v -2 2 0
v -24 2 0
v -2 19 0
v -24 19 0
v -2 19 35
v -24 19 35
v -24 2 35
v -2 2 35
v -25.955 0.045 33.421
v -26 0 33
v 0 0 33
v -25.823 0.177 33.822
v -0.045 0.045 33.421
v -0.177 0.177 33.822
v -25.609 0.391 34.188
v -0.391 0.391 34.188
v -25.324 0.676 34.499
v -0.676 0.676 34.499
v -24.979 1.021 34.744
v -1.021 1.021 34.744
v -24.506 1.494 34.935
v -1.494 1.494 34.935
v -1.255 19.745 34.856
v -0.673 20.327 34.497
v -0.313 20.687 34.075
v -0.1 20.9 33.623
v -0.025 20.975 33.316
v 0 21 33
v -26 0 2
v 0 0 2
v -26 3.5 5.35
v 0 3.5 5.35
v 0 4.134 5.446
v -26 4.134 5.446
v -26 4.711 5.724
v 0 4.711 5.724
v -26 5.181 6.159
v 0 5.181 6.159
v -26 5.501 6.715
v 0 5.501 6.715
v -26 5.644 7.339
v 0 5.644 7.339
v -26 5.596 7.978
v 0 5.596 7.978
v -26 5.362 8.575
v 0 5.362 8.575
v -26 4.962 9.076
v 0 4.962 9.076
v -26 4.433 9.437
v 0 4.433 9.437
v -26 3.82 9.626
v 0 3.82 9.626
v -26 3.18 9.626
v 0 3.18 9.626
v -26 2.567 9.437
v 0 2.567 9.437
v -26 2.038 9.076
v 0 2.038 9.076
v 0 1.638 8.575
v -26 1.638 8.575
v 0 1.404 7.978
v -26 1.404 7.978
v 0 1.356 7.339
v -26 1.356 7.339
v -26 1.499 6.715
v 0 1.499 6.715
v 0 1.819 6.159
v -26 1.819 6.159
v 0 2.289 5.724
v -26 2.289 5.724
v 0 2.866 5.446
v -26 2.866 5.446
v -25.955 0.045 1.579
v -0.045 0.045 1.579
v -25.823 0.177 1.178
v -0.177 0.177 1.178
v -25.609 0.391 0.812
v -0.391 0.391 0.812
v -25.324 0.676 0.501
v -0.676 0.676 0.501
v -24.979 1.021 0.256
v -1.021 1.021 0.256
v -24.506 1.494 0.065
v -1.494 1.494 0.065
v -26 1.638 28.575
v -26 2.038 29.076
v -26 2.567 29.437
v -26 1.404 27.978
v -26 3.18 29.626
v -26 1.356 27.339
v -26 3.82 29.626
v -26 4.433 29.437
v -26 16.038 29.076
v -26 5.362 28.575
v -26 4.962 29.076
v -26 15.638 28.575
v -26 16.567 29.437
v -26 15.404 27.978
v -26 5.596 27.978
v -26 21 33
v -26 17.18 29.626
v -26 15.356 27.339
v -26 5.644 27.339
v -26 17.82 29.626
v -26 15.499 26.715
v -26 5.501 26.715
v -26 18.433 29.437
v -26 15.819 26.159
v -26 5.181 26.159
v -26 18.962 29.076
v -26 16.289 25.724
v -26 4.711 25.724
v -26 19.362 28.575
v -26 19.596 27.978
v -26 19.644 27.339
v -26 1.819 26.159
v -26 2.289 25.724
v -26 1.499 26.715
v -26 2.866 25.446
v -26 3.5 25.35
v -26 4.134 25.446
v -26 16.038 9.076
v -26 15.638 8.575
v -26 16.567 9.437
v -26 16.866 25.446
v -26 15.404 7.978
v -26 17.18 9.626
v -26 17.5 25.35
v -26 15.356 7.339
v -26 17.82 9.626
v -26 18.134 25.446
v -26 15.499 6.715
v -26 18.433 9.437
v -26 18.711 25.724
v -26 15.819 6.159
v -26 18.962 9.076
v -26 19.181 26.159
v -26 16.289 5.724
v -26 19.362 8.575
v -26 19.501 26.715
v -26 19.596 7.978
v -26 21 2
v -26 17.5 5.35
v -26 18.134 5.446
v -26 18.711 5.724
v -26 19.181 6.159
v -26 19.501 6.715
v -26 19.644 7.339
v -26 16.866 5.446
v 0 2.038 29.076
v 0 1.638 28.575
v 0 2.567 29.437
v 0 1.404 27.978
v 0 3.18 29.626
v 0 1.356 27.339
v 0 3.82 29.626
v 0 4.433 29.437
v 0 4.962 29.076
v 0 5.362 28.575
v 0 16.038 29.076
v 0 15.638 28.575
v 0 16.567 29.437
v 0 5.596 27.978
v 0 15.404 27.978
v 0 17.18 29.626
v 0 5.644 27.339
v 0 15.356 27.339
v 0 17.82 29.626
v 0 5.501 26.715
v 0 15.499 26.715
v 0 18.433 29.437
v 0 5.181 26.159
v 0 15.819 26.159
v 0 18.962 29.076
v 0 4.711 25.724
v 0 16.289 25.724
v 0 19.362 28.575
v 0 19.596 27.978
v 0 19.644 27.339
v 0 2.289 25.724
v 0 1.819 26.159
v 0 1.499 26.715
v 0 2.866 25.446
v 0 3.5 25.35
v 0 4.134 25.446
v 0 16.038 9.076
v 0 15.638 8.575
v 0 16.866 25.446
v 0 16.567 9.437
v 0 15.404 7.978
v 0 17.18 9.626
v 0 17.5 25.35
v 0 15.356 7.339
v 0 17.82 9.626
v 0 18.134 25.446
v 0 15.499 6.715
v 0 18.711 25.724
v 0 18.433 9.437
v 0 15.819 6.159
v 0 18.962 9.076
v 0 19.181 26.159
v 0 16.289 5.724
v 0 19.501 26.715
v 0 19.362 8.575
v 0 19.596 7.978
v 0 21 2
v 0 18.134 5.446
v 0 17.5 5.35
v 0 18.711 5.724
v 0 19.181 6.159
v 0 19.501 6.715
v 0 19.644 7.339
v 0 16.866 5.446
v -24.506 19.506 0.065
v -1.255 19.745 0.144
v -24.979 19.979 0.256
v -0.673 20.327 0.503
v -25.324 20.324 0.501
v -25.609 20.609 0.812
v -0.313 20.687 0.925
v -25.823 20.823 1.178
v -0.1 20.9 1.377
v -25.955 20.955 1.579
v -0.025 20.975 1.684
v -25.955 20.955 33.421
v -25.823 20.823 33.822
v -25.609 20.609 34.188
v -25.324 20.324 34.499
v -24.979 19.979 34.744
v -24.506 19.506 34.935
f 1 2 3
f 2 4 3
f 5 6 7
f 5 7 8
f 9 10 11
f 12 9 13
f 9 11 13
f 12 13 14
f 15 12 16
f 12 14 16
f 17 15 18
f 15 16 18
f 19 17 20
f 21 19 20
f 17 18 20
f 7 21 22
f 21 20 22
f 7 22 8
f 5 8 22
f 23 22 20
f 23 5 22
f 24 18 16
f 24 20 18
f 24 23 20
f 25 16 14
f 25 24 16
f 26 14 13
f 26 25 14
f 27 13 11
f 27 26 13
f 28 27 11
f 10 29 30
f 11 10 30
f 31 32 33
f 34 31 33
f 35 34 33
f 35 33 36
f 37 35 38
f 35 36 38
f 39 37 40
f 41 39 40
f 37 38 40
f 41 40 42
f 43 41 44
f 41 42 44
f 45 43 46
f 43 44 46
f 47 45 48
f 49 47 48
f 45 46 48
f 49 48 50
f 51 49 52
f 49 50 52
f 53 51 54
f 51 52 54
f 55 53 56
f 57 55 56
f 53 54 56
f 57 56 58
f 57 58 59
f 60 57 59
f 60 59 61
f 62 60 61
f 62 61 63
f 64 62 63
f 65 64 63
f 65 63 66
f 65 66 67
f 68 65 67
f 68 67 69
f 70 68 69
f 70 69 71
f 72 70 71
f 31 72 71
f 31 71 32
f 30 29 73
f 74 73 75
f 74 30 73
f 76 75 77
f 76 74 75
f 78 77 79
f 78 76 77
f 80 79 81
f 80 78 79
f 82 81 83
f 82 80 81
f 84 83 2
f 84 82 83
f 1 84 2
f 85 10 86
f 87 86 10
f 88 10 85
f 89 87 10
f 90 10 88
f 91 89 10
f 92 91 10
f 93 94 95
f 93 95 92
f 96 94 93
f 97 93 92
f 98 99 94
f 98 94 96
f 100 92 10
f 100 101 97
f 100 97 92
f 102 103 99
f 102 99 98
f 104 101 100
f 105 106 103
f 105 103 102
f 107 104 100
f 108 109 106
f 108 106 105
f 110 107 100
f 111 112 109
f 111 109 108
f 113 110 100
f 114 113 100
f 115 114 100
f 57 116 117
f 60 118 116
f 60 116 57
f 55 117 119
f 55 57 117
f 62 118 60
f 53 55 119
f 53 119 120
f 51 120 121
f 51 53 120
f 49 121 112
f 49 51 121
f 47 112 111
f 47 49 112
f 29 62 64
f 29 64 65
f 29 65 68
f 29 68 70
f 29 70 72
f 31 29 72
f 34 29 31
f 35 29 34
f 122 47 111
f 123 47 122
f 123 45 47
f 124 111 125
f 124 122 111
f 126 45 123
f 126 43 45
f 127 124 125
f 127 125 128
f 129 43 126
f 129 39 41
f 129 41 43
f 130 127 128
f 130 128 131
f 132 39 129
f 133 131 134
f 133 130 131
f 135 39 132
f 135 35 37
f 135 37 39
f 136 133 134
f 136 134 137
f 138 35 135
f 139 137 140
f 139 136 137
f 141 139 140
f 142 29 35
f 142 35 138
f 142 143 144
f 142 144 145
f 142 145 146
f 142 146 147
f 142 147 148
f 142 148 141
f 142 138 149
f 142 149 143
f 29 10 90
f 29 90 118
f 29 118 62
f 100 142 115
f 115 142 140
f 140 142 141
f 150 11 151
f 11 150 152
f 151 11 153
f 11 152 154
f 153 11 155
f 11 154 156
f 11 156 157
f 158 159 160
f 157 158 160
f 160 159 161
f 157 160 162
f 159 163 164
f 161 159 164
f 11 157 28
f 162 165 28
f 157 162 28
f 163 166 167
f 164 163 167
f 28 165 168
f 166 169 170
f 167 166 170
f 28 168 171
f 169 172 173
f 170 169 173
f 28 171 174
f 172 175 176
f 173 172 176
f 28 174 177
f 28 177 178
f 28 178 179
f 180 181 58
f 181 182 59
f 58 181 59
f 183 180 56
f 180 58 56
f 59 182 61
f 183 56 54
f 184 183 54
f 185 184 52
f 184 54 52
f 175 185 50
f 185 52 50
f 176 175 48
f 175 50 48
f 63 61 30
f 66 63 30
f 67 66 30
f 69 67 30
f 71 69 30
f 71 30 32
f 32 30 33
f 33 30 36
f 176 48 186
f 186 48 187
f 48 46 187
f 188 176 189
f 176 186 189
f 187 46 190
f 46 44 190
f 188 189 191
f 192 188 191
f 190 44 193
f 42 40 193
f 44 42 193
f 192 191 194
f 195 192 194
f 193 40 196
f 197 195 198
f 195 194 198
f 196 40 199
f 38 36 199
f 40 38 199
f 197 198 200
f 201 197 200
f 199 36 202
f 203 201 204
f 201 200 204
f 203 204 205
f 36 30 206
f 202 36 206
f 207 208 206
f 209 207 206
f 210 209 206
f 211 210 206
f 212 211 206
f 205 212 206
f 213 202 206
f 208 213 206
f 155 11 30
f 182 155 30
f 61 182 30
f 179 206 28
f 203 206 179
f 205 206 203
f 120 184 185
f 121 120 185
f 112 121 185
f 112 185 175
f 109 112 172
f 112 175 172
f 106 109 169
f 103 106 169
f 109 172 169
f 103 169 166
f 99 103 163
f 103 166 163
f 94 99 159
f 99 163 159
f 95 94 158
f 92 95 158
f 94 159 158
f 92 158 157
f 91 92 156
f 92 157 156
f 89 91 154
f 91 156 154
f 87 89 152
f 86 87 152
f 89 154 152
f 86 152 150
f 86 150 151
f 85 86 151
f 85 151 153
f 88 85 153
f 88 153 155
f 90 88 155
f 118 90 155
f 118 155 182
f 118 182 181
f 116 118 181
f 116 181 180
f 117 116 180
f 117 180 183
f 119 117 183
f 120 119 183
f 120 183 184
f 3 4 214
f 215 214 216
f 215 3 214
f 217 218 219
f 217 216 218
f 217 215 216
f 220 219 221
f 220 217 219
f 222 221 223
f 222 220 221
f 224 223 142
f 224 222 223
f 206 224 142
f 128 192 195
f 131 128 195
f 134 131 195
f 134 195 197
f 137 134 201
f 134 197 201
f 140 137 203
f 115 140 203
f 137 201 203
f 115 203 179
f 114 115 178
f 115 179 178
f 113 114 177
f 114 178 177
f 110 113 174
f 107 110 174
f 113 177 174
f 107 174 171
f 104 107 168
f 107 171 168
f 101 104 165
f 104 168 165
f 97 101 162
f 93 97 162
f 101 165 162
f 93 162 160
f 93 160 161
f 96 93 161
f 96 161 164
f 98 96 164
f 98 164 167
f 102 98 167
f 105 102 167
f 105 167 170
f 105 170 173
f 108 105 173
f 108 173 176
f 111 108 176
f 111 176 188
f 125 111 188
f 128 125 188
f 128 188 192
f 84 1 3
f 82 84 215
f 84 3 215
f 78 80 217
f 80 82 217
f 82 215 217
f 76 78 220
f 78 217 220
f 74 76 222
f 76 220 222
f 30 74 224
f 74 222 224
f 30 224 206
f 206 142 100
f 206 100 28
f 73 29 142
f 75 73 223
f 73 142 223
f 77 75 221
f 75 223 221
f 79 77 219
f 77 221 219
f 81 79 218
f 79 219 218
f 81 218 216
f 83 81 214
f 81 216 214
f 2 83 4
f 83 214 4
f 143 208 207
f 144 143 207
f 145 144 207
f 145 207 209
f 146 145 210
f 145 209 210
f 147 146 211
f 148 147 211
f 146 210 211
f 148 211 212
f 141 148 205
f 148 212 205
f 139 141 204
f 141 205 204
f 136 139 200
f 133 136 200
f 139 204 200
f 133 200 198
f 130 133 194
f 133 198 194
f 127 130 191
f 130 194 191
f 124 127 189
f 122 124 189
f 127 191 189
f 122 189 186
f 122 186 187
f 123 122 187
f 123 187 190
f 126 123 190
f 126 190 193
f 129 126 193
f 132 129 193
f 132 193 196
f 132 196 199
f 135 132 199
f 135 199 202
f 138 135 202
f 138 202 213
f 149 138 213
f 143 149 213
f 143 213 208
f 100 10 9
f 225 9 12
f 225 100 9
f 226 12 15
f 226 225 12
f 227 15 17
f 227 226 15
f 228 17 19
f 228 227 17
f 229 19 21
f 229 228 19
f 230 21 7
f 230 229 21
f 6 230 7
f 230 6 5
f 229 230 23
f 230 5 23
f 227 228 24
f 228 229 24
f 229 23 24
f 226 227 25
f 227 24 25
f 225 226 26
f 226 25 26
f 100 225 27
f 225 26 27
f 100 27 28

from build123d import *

# Parameters (mm, degrees)
SKETCH_1_W          = 26
SKETCH_1_H          = 21
EXTRUDE_1_DEPTH     = 35
CUT_EXTRUDE_1_REACH = 50.394
SKETCH_2_R          = 2.15
FILLET_1_R          = 2


with BuildPart() as part:
    # 草图1 → 凸台-拉伸1 (new body)
    with BuildSketch(Plane.XY):
        with Locations((-13, 10.5)):
            Rectangle(SKETCH_1_W, SKETCH_1_H)
    extrude(amount=EXTRUDE_1_DEPTH)

    # 草图2 → 切除-拉伸1 (cut, up to next)
    with BuildSketch(Plane(origin=(0, 0, 0), x_dir=(0, 0, -1), z_dir=(1, 0, 0)), mode=Mode.PRIVATE) as cut_extrude_1_sk1:
        with Locations((-27.5, 17.5)):
            Circle(SKETCH_2_R)
    cut_extrude_1_tool1 = extrude(cut_extrude_1_sk1.sketch, amount=-CUT_EXTRUDE_1_REACH, mode=Mode.PRIVATE) & part.part
    # 草图2 → 切除-拉伸1 (cut, up to next)
    with BuildSketch(Plane(origin=(0, 0, 0), x_dir=(0, 0, -1), z_dir=(1, 0, 0)), mode=Mode.PRIVATE) as cut_extrude_1_sk2:
        with Locations((-27.5, 3.5)):
            Circle(SKETCH_2_R)
    cut_extrude_1_tool2 = extrude(cut_extrude_1_sk2.sketch, amount=-CUT_EXTRUDE_1_REACH, mode=Mode.PRIVATE) & part.part
    # 草图2 → 切除-拉伸1 (cut, up to next)
    with BuildSketch(Plane(origin=(0, 0, 0), x_dir=(0, 0, -1), z_dir=(1, 0, 0)), mode=Mode.PRIVATE) as cut_extrude_1_sk3:
        with Locations((-7.5, 17.5)):
            Circle(SKETCH_2_R)
    cut_extrude_1_tool3 = extrude(cut_extrude_1_sk3.sketch, amount=-CUT_EXTRUDE_1_REACH, mode=Mode.PRIVATE) & part.part
    # 草图2 → 切除-拉伸1 (cut, up to next)
    with BuildSketch(Plane(origin=(0, 0, 0), x_dir=(0, 0, -1), z_dir=(1, 0, 0)), mode=Mode.PRIVATE) as cut_extrude_1_sk4:
        with Locations((-7.5, 3.5)):
            Circle(SKETCH_2_R)
    cut_extrude_1_tool4 = extrude(cut_extrude_1_sk4.sketch, amount=-CUT_EXTRUDE_1_REACH, mode=Mode.PRIVATE) & part.part
    add(cut_extrude_1_tool1.solids().sort_by_distance((0, 17.5, 27.5))[0], mode=Mode.SUBTRACT)
    add(cut_extrude_1_tool2.solids().sort_by_distance((0, 3.5, 27.5))[0], mode=Mode.SUBTRACT)
    add(cut_extrude_1_tool3.solids().sort_by_distance((0, 17.5, 7.5))[0], mode=Mode.SUBTRACT)
    add(cut_extrude_1_tool4.solids().sort_by_distance((0, 3.5, 7.5))[0], mode=Mode.SUBTRACT)

    # 圆角1
    fillet_1_edges = [part.edges().sort_by_distance(p)[0] for p in [
        (-26, 10.5, 35),
        (-13, 0, 35),
        (0, 10.5, 35),
        (-13, 0, 0),
        (-26, 10.5, 0),
        (-13, 21, 0),
        (0, 10.5, 0),
        (-13, 21, 35),
    ]]
    fillet(fillet_1_edges, radius=FILLET_1_R)


solid = part.part
